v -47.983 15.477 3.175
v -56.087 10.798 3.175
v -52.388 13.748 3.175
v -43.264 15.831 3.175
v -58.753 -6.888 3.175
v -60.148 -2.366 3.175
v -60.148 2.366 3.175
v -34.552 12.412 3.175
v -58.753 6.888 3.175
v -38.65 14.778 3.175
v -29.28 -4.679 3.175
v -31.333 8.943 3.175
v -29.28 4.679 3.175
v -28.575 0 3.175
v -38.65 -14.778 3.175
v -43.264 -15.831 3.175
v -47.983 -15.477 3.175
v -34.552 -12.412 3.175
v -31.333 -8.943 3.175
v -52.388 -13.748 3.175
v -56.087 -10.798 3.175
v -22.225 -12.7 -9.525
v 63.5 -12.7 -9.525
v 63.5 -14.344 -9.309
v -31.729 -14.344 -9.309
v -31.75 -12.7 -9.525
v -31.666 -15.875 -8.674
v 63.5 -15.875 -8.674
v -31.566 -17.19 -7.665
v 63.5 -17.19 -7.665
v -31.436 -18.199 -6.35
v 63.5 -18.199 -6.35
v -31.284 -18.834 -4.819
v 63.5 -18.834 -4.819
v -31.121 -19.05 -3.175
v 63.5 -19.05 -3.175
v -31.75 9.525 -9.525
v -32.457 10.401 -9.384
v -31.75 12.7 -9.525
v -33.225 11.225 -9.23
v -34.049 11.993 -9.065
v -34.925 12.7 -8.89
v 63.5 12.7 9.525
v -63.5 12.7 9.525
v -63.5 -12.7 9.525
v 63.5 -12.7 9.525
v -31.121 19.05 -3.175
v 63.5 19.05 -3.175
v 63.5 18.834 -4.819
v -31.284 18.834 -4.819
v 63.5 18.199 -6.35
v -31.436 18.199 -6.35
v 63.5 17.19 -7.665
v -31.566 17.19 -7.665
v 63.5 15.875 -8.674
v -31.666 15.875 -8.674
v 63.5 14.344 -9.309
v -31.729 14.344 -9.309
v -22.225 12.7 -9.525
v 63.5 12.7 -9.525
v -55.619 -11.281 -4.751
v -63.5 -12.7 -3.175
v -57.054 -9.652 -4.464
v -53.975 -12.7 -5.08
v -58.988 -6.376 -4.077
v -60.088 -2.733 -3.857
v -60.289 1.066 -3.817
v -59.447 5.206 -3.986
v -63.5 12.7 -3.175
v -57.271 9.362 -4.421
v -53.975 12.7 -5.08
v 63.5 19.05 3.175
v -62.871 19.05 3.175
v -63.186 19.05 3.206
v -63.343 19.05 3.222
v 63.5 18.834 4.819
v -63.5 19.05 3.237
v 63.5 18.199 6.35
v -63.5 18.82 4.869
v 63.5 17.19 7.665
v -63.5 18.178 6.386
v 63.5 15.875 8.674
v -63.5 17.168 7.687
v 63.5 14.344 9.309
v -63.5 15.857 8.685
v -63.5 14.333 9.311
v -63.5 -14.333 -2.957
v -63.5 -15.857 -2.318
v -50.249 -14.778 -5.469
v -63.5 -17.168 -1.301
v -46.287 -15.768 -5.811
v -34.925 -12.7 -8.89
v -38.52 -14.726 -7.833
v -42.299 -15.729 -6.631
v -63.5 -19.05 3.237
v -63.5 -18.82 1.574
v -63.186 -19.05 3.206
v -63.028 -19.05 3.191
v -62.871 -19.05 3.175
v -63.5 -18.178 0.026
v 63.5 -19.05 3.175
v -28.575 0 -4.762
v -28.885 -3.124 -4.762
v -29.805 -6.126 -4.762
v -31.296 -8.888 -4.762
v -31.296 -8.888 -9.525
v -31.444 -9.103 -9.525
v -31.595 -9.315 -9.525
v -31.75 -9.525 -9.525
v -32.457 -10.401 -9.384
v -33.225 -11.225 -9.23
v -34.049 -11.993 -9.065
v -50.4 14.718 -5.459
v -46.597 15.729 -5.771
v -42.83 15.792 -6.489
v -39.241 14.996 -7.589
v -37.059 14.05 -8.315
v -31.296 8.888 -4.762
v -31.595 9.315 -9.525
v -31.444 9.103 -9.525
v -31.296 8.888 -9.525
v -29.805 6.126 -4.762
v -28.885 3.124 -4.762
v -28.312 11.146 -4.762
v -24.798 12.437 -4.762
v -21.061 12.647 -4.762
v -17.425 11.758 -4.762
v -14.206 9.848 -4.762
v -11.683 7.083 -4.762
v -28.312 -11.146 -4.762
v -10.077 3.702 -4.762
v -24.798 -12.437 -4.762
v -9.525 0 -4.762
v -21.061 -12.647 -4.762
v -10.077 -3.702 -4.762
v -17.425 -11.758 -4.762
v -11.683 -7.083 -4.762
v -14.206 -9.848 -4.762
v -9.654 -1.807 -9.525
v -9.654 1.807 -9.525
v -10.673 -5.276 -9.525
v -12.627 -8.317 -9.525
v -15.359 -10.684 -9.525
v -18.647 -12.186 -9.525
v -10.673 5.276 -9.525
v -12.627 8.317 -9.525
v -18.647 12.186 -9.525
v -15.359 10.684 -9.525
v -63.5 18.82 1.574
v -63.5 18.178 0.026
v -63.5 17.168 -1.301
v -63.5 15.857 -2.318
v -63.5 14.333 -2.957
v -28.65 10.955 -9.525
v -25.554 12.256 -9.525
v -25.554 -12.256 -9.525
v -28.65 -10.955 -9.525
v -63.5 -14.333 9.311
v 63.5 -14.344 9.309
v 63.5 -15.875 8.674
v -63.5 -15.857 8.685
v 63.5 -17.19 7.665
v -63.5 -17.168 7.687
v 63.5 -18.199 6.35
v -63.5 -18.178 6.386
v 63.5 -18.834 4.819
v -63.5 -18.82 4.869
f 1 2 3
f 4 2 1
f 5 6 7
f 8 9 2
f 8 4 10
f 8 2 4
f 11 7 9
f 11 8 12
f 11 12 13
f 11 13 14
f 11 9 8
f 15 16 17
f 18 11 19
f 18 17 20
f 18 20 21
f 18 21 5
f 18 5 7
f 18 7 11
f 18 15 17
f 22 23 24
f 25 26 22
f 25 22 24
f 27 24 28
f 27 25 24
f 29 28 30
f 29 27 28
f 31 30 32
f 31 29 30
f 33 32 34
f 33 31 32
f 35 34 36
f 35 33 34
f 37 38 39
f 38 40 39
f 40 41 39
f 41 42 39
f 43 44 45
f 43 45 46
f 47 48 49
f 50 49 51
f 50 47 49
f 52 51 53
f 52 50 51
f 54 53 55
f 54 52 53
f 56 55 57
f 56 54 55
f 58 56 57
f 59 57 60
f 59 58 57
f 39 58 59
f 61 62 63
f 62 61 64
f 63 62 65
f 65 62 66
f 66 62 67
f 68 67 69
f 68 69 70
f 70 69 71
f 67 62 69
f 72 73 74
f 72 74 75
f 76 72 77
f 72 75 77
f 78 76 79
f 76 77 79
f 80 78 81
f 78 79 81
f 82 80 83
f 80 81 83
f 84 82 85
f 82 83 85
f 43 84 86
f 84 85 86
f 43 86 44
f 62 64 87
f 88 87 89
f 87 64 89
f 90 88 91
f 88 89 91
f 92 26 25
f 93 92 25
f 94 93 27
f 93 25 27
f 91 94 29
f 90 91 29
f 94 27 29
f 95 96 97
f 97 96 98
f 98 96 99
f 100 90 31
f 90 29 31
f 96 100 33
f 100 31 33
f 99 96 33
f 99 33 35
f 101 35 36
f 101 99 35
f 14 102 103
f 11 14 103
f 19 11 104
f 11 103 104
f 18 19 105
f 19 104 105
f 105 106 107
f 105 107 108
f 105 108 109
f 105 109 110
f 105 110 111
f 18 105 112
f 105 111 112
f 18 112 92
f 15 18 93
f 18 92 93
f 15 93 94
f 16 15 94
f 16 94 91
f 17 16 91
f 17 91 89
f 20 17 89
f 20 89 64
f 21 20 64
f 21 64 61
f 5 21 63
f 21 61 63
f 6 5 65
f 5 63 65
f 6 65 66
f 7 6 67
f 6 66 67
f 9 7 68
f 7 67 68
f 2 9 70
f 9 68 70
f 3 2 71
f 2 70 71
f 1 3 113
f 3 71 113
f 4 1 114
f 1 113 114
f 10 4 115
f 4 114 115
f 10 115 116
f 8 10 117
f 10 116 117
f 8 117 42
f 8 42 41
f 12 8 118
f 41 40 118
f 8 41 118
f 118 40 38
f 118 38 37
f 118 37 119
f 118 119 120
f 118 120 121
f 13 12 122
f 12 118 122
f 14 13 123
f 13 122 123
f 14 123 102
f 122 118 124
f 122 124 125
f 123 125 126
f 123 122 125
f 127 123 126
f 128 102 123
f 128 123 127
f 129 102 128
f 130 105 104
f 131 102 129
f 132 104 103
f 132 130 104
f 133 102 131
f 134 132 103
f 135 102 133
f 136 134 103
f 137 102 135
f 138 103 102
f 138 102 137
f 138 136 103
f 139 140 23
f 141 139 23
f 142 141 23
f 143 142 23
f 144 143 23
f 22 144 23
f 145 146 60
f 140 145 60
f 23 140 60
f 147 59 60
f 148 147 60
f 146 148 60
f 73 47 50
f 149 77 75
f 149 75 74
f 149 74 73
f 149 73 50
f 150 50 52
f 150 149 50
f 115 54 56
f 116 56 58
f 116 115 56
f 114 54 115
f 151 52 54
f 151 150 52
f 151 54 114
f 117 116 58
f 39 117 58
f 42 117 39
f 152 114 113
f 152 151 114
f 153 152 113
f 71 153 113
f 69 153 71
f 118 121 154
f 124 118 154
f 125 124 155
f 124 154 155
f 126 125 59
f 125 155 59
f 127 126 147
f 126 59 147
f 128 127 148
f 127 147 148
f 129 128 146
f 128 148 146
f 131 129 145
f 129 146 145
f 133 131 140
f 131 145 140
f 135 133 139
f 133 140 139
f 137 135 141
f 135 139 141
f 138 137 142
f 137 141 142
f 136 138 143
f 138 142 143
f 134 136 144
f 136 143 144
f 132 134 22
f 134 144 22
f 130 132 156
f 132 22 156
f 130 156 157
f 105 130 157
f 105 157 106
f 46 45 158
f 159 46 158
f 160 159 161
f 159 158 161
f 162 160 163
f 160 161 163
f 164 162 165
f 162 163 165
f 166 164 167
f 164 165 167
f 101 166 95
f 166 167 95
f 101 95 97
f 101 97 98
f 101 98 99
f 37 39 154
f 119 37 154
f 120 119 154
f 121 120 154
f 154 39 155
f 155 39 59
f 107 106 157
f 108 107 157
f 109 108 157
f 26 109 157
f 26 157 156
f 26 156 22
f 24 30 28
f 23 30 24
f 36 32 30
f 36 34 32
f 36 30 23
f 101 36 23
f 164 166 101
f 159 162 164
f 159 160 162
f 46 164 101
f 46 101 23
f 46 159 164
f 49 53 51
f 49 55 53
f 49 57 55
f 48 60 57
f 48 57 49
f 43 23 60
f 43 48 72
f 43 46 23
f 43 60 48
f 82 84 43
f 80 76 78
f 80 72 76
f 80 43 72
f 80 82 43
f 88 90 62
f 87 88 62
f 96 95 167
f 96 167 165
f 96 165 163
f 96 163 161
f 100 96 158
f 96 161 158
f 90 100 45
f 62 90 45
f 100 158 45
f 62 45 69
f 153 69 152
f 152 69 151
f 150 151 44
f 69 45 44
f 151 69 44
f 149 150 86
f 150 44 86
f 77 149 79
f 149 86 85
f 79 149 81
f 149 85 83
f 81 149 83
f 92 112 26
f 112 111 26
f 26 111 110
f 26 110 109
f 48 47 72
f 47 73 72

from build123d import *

# Parameters (mm, degrees)
F0_W        = 127
F0_H        = 38.1
F1_DEPTH    = 9.525
F2_R        = 15.875
F3_DEPTH    = 12.7
F5_DEPTH    = 4.7625
F7_DEPTH    = 38.101
F8_T1_DEPTH = 158.75
F8_T3_DEPTH = 95.8787739113
F8_T5_DEPTH = 95.8787739113


# Not quite as in the source:
# - a fillet or chamfer that OpenCascade refuses, or shapes differently, is made with other operations: its cross-section is extruded or revolved along the edge and cut away or added


with BuildPart() as f1:
    # F0 (on Top) → F1 (new body, symmetric)
    with BuildSketch(Plane.XY):
        Rectangle(F0_W, F0_H)
    extrude(amount=F1_DEPTH, both=True)

    # F2 (on face) → F3 (cut)
    with BuildSketch(Plane(origin=(0, 0, -9.525), x_dir=(1, 0, 0), z_dir=(0, 0, -1))):
        with Locations((-44.45, 0)):
            Circle(F2_R)
    extrude(amount=-F3_DEPTH, mode=Mode.SUBTRACT)

    # F4 (on face) → F5 (cut)
    with BuildSketch(Plane(origin=(0, 0, -9.525), x_dir=(1, 0, 0), z_dir=(0, 0, -1))):
        with BuildLine():
            ThreePointArc((-31.2964285714, -8.8881484952), (-17.4248511928, -11.7579152671), (-9.525, 0))
            ThreePointArc((-9.525, 0), (-17.4248511928, 11.7579152671), (-31.2964285714, 8.8881484952))
            ThreePointArc((-31.2964285714, 8.8881484952), (-29.2705966615, 4.6477240974), (-28.575, 0))
            ThreePointArc((-28.575, 0), (-29.2705966615, -4.6477240974), (-31.2964285714, -8.8881484952))
        make_face()
    extrude(amount=-F5_DEPTH, mode=Mode.SUBTRACT)

    # F6 (on face) → F7 (cut, through all)
    with BuildSketch(Plane(origin=(0, 19.05, 0), x_dir=(-1, 0, 0), z_dir=(0, 1, 0))):
        Polygon((31.75, -9.525), (63.5, -9.525), (63.5, -3.175), align=None)
    extrude(amount=-F7_DEPTH, mode=Mode.SUBTRACT)

    # F8: fillet of radius 6.35 on 6 edges, made by hand

    # F8_s2 → F8_t1 (cut)
    with BuildSketch(Plane.YZ.offset(-79.375)):
        with BuildLine():
            ThreePointArc((-12.7, 9.525), (-17.1901280605, 7.6651280605), (-19.05, 3.175))
            Line((-19.05, 3.175), (-19.05, 9.525))
            Line((-19.05, 9.525), (-12.7, 9.525))
        make_face()
        with BuildLine():
            ThreePointArc((19.05, 3.175), (17.1901280605, 7.6651280605), (12.7, 9.525))
            Line((12.7, 9.525), (19.05, 9.525))
            Line((19.05, 9.525), (19.05, 3.175))
        make_face()
        with BuildLine():
            ThreePointArc((-12.7, -9.525), (-17.1901280605, -7.6651280605), (-19.05, -3.175))
            Line((-19.05, -3.175), (-19.05, -9.525))
            Line((-19.05, -9.525), (-12.7, -9.525))
        make_face()
        with BuildLine():
            ThreePointArc((19.05, -3.175), (17.1901280605, -7.6651280605), (12.7, -9.525))
            Line((12.7, -9.525), (19.05, -9.525))
            Line((19.05, -9.525), (19.05, -3.175))
        make_face()
    extrude(amount=F8_T1_DEPTH, mode=Mode.SUBTRACT)

    # F8_s4 → F8_t3 (cut)
    with BuildSketch(Plane(origin=(-76.0138336112, 0, 15.2027667222), x_dir=(0, 1, 0), z_dir=(0.9805806757, 0, -0.1961161351))):
        with BuildLine():
            ThreePointArc((19.05, -9.2167182266), (17.1901280605, -13.7068462871), (12.7, -15.5667182266))
            Line((12.7, -15.5667182266), (19.05, -15.5667182266))
            Line((19.05, -15.5667182266), (19.05, -9.2167182266))
        make_face()
    extrude(amount=F8_T3_DEPTH, mode=Mode.SUBTRACT)

    # F8_s6 → F8_t5 (cut)
    with BuildSketch(Plane(origin=(18.0030392952, 0, -3.600607859), x_dir=(0, 1, 0), z_dir=(-0.9805806757, 0, 0.1961161351))):
        with BuildLine():
            ThreePointArc((-12.7, 15.5667182266), (-17.1901280605, 13.7068462871), (-19.05, 9.2167182266))
            Line((-19.05, 9.2167182266), (-19.05, 15.5667182266))
            Line((-19.05, 15.5667182266), (-12.7, 15.5667182266))
        make_face()
    extrude(amount=F8_T5_DEPTH, mode=Mode.SUBTRACT)


solid = f1.part
